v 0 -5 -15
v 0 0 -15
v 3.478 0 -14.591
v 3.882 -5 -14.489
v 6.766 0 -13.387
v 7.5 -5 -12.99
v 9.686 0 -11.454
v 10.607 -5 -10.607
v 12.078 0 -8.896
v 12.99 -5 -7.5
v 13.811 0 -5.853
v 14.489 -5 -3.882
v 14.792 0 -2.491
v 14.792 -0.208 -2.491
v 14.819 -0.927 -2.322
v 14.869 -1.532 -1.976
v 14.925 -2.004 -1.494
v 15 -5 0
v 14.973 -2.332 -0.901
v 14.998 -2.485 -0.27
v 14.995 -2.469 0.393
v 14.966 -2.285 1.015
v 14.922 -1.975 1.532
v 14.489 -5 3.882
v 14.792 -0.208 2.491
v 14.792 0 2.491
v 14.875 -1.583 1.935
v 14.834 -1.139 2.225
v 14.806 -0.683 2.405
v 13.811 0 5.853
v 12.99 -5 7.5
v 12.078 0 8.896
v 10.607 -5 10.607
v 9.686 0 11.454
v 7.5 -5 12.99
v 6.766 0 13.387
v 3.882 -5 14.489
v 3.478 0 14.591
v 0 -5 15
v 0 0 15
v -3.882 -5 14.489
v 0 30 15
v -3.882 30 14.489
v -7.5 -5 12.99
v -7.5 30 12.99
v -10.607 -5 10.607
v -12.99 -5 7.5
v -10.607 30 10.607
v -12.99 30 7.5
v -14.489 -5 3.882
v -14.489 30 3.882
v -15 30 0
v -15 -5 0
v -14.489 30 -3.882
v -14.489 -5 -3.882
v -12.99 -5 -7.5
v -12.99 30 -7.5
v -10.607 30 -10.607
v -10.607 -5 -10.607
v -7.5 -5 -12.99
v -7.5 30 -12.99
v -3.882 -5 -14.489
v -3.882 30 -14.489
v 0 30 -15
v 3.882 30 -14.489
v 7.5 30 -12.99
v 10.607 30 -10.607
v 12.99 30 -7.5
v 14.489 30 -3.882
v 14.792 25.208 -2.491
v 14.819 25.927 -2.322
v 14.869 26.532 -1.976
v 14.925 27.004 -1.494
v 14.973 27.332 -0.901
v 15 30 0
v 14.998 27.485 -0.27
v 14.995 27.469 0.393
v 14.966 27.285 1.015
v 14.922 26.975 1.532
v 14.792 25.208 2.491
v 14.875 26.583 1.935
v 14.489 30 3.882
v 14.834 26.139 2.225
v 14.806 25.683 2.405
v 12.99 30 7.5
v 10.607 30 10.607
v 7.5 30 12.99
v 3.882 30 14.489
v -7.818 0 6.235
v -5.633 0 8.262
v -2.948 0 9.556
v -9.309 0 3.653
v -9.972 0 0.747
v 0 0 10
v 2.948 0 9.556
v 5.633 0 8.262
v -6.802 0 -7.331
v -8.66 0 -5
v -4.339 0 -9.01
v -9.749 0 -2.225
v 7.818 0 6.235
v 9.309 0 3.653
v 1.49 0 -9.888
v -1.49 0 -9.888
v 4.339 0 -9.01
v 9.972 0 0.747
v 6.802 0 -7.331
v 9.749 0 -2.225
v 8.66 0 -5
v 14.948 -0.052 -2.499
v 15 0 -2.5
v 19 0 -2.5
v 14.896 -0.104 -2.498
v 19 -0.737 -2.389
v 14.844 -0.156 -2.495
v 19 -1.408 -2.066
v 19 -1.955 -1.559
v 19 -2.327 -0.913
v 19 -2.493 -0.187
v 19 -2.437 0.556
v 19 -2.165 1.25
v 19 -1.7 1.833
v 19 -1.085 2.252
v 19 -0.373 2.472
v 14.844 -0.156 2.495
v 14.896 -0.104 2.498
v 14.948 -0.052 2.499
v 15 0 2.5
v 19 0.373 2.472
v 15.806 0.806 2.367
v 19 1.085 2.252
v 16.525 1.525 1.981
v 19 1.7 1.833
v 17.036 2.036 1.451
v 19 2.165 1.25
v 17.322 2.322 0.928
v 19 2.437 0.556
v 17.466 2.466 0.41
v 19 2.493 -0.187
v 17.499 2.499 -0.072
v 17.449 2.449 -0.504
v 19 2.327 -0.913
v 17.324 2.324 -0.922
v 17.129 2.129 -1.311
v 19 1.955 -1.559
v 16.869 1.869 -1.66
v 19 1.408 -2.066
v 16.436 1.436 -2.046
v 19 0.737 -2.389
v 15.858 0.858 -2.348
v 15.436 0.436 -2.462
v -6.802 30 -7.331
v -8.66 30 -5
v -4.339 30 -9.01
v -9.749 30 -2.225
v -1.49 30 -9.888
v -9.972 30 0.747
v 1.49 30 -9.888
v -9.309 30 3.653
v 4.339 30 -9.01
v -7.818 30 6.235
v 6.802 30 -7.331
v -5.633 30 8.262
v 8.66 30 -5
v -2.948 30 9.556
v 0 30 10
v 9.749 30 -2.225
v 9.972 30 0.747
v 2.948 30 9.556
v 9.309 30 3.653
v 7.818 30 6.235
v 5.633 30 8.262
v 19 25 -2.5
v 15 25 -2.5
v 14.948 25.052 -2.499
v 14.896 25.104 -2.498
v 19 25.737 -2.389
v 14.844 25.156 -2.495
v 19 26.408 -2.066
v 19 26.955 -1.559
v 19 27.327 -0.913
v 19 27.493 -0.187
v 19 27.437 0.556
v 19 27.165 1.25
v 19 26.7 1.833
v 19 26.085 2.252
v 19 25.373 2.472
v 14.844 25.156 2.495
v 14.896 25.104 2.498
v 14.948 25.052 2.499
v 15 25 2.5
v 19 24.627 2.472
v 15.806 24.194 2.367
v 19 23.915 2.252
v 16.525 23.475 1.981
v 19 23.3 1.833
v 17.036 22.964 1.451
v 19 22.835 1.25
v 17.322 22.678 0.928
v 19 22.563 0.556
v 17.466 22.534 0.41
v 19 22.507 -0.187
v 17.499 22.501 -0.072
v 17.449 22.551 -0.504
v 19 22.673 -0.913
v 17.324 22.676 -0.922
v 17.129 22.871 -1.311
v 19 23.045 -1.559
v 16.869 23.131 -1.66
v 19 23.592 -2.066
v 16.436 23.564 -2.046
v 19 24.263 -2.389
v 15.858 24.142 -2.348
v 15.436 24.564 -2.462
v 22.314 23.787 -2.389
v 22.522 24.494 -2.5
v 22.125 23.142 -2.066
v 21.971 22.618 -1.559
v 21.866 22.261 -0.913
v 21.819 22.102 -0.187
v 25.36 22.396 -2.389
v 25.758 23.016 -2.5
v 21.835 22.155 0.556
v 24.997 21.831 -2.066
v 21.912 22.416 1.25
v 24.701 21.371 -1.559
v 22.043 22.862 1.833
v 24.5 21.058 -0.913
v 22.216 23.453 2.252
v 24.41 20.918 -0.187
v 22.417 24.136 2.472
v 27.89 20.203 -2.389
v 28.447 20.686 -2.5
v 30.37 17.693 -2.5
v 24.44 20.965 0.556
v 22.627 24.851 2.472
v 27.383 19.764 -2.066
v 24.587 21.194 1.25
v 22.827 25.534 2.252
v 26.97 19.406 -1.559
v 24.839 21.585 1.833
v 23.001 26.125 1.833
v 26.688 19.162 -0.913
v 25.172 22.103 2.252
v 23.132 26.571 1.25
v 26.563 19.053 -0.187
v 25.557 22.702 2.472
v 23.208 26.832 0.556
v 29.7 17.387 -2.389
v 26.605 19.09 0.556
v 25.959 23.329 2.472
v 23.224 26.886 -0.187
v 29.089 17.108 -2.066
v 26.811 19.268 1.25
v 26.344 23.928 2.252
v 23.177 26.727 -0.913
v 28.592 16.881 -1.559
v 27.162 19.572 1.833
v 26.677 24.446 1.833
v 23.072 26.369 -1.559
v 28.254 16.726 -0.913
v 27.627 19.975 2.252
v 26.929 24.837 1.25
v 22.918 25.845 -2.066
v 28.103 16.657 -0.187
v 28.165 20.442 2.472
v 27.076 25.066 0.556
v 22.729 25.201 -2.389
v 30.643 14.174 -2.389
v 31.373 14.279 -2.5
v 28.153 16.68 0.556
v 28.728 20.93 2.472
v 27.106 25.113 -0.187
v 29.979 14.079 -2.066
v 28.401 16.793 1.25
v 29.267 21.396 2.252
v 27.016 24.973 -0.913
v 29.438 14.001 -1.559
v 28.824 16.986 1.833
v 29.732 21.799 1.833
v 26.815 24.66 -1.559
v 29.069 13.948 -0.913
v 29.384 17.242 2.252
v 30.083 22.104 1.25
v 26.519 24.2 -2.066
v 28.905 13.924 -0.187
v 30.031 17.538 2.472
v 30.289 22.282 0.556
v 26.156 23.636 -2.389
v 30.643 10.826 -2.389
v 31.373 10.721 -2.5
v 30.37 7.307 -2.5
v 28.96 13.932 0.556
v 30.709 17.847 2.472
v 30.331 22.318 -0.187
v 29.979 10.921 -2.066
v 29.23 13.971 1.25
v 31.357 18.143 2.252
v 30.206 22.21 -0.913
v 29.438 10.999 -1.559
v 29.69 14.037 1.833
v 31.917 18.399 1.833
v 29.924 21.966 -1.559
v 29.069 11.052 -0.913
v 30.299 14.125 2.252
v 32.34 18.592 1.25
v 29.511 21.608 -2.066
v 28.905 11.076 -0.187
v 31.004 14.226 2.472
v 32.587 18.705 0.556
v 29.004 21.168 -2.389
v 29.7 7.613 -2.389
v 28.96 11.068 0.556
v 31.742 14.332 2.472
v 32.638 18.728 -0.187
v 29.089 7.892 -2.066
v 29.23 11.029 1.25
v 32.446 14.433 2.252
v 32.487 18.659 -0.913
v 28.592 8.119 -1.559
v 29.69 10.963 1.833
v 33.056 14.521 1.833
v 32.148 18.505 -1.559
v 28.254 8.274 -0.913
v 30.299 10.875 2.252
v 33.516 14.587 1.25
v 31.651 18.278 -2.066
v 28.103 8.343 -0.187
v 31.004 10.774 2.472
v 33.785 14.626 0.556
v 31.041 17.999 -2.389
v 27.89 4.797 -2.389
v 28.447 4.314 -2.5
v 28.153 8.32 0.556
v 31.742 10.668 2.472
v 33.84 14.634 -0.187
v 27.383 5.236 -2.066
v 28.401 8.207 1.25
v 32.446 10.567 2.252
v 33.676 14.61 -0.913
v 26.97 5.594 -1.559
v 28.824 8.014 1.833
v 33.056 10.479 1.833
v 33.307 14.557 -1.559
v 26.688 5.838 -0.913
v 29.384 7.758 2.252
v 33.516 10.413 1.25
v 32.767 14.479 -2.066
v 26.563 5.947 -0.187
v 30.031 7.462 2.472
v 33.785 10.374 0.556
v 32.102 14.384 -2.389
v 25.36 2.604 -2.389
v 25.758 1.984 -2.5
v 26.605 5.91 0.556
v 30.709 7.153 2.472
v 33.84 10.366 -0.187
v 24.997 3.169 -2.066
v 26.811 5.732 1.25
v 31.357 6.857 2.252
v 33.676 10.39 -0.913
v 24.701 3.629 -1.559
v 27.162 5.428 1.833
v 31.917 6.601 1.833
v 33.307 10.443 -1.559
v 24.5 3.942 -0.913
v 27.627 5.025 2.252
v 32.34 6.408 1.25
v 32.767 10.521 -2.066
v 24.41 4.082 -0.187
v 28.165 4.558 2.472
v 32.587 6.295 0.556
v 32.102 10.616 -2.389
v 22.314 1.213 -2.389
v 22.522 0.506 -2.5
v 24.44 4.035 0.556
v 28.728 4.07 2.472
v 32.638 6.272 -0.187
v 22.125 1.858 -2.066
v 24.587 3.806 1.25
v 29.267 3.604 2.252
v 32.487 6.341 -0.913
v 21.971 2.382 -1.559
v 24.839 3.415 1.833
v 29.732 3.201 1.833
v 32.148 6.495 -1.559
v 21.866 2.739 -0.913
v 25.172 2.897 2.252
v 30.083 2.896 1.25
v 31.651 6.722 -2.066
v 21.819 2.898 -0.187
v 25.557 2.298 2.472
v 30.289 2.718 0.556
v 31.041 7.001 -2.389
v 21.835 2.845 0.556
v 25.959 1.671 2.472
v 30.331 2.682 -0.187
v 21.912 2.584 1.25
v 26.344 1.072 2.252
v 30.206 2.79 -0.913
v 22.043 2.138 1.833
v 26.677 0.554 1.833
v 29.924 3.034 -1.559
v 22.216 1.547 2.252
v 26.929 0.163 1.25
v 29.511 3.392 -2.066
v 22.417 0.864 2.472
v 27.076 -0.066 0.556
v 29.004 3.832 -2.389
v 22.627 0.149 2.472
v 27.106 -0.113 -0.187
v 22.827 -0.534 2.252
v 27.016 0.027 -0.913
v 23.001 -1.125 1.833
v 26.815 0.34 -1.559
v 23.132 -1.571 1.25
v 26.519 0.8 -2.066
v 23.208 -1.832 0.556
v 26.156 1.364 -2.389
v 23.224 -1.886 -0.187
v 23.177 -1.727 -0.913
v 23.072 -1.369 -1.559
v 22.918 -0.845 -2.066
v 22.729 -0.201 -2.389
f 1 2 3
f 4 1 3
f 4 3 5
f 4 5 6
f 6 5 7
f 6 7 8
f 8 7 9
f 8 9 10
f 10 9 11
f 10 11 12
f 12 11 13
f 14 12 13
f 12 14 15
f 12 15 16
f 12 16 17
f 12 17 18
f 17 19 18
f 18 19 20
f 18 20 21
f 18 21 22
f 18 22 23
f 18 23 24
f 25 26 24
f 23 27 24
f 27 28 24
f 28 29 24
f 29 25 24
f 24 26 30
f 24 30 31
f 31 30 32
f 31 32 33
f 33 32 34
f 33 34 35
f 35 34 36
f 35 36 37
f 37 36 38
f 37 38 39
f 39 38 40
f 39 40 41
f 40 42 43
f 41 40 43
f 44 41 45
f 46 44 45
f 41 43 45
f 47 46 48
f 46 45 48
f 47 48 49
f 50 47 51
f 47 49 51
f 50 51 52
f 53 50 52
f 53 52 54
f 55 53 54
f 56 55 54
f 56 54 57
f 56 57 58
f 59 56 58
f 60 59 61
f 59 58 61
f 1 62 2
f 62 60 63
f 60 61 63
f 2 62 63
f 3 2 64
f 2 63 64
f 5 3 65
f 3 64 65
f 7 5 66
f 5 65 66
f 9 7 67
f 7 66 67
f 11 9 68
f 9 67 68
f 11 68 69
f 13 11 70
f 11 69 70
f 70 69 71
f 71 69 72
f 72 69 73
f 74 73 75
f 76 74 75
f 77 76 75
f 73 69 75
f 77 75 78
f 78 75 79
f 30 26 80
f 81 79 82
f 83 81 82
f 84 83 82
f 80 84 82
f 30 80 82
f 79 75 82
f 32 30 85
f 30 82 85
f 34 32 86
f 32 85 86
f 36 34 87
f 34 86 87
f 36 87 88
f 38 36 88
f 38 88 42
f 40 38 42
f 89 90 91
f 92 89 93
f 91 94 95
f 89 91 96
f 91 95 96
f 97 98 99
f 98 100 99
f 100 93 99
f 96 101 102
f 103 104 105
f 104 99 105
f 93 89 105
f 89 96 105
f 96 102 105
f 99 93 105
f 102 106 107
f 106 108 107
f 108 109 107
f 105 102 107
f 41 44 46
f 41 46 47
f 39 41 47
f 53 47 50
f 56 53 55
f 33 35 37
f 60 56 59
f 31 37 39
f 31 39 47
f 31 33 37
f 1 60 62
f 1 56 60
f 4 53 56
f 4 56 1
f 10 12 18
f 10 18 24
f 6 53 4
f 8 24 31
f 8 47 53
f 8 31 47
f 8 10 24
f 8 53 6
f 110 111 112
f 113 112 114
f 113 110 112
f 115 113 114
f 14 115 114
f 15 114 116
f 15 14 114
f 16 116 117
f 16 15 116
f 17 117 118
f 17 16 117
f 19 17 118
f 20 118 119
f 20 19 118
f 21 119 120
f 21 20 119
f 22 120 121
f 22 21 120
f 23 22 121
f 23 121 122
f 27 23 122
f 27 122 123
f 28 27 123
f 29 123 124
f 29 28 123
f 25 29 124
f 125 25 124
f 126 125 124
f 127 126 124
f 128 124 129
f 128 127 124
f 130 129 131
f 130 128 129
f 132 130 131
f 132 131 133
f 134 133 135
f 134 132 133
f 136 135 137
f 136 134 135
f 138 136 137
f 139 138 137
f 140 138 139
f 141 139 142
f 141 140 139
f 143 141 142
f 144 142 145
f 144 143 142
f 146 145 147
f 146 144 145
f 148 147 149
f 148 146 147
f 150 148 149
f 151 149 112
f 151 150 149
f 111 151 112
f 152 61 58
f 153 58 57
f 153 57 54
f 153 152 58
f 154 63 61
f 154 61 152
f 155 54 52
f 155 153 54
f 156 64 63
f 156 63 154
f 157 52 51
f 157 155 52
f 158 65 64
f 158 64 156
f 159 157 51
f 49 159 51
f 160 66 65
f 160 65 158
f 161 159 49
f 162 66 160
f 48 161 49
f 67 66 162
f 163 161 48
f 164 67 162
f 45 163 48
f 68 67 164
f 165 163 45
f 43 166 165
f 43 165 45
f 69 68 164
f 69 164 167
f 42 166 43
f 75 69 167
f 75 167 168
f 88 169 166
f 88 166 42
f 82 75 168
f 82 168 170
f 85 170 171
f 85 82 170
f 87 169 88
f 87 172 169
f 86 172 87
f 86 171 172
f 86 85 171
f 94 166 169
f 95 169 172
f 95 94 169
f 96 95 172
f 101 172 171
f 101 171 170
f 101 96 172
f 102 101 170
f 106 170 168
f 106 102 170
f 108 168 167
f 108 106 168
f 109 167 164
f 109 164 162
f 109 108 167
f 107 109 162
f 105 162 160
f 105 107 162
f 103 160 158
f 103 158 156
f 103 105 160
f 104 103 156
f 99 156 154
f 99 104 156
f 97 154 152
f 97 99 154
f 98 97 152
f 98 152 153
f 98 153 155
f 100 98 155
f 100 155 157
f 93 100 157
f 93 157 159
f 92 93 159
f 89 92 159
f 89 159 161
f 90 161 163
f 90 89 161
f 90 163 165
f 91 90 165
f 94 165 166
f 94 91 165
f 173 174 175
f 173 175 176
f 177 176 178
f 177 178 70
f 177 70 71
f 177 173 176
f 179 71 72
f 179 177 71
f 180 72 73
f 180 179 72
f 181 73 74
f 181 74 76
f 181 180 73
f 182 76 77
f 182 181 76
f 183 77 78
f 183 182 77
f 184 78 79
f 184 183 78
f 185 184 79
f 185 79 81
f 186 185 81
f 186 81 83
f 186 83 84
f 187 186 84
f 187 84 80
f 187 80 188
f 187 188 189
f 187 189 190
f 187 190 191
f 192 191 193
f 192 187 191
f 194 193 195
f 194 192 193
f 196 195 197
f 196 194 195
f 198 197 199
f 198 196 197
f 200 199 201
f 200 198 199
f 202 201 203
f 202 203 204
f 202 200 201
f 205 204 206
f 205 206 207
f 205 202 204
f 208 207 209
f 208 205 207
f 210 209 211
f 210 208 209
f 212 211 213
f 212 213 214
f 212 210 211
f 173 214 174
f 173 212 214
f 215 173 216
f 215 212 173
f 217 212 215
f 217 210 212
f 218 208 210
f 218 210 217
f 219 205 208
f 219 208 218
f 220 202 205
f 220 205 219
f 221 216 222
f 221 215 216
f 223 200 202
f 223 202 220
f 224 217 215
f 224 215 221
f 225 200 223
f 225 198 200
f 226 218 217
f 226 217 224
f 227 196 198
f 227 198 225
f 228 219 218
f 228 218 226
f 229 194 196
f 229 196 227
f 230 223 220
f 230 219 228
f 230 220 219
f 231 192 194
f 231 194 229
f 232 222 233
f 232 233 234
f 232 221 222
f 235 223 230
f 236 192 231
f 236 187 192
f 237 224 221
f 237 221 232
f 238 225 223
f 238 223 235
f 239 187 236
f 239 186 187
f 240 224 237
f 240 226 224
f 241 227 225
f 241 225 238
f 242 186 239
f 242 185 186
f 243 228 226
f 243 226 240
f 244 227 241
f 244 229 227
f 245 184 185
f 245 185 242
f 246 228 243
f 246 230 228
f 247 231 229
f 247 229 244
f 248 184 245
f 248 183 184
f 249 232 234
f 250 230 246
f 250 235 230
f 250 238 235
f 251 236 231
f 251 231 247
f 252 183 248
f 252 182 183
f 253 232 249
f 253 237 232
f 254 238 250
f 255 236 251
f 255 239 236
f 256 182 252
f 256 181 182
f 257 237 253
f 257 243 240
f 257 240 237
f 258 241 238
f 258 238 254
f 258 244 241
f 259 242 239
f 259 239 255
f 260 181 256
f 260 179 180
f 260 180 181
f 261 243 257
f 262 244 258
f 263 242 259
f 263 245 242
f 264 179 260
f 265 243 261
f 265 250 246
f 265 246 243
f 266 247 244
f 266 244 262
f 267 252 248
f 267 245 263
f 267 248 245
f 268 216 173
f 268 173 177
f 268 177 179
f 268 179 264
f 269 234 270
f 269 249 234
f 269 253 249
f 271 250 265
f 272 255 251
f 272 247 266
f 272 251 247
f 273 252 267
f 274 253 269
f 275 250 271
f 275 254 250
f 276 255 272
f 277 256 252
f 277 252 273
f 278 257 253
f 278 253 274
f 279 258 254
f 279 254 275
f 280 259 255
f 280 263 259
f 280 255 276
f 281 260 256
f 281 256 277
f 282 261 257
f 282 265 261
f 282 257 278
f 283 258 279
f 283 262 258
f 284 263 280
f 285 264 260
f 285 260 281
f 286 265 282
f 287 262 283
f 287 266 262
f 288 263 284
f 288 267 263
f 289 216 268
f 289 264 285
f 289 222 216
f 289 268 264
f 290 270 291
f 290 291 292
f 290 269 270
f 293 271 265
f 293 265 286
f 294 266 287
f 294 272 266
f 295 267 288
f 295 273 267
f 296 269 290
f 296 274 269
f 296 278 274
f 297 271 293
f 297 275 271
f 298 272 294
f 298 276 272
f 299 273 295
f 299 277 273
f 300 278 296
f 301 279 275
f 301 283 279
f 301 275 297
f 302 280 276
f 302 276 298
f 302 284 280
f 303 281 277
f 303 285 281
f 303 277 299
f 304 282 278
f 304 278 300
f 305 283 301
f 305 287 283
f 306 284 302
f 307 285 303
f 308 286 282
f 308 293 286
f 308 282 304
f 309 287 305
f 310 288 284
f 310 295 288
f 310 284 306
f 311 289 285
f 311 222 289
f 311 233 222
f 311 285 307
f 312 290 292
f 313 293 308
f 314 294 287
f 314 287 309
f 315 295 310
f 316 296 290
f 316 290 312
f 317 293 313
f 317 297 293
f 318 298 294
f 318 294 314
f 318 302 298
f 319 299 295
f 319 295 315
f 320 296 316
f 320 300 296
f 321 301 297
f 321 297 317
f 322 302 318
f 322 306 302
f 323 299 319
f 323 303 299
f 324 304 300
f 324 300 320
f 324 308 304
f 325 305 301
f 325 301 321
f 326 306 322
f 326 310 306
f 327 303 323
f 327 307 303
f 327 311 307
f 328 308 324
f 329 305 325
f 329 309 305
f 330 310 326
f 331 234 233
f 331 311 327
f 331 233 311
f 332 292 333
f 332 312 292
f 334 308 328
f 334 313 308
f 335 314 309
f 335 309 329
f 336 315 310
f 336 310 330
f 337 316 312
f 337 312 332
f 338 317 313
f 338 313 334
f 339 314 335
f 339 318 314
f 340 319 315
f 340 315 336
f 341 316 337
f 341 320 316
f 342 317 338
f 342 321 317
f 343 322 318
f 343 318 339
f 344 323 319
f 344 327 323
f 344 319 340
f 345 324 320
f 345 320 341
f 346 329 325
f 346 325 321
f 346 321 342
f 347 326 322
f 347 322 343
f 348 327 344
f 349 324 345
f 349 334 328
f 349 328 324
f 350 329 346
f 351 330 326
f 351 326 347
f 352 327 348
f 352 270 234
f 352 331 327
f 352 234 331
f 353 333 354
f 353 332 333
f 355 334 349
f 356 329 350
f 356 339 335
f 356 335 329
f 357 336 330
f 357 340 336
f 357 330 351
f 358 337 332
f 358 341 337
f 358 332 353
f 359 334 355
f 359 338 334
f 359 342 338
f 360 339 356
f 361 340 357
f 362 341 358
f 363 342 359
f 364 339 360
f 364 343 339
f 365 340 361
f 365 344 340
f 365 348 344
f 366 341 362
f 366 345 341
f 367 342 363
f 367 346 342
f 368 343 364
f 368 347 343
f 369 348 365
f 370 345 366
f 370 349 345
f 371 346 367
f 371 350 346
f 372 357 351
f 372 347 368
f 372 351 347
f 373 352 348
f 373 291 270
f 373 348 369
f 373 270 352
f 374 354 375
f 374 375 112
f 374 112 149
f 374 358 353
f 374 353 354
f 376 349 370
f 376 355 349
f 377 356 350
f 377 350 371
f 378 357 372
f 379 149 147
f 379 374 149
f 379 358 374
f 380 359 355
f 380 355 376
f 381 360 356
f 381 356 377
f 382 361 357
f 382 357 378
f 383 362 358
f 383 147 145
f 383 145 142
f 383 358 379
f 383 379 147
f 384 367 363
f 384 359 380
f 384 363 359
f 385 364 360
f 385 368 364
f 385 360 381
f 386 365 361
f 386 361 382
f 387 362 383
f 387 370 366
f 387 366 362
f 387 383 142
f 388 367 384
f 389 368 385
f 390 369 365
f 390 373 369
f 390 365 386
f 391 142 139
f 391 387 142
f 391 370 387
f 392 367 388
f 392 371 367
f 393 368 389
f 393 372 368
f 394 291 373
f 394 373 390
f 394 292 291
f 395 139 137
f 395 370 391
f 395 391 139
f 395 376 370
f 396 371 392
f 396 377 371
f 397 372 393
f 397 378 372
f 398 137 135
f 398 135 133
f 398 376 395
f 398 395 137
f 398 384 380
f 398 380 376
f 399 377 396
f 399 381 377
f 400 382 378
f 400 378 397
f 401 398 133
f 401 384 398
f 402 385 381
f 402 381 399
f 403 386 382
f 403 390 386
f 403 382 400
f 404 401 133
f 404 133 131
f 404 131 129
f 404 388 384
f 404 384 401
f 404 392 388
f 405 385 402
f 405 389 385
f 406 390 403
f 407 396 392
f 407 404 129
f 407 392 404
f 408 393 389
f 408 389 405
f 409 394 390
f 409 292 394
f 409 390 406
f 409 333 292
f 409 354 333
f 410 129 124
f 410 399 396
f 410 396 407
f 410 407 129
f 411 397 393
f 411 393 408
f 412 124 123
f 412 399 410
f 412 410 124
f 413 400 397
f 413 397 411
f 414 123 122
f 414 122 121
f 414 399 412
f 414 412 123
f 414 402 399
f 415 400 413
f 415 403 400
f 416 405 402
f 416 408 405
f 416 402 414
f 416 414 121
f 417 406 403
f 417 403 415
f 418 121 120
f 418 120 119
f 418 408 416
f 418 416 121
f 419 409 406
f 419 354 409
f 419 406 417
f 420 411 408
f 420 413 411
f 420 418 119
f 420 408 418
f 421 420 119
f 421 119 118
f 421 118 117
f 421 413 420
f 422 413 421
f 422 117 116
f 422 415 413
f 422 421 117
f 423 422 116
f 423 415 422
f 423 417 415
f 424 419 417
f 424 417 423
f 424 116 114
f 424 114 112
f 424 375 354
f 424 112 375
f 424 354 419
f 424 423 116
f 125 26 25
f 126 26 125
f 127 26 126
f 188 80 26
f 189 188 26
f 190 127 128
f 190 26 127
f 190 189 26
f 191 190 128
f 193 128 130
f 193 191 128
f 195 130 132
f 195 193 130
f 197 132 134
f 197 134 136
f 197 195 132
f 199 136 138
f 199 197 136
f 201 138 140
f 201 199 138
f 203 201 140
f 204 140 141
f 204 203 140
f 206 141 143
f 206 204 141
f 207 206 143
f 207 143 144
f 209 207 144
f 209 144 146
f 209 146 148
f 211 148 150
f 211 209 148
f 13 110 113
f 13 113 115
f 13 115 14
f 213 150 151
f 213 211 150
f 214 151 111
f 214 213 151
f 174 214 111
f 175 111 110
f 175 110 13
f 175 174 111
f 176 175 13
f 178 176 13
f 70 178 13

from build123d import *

# Parameters (mm, degrees)
SKETCH1_R           = 15
SKETCH1_R_2         = 10
BOSS_EXTRUDE1_DEPTH = 30
SKETCH2_R           = 15
BOSS_EXTRUDE2_DEPTH = 5
SKETCH7_R           = 2.5


with BuildPart() as part:
    # Sketch1 → Boss-Extrude1 (new body)
    with BuildSketch(Plane(origin=(0, 0, 0), x_dir=(1, 0, 0), z_dir=(0, 1, 0))):
        with Locations(Location((0, 0, 0), (0, 0, 270))):  # turned: the seam where the file's is
            Circle(SKETCH1_R)
        with Locations(Location((0, 0, 0), (0, 0, 270))):  # turned: the seam where the file's is
            Circle(SKETCH1_R_2, mode=Mode.SUBTRACT)
    extrude(amount=BOSS_EXTRUDE1_DEPTH)

    # Sketch2 → Boss-Extrude2 (add)
    with BuildSketch(Plane.XZ):
        with Locations(Location((0, 0, 0), (0, 0, 270))):  # turned: the seam where the file's is
            Circle(SKETCH2_R)
    extrude(amount=BOSS_EXTRUDE2_DEPTH)

    # Sweep6: sweep along a path in Sketch3
    with BuildLine(Plane.XY) as sweep6_path:
        Line((15, 25), (19, 25))
        ThreePointArc((19, 25), (31.5, 12.5), (19, 0))
        Line((19, 0), (15, 0))
        Line((15, 0), (15, 25))
    # Sketch7 → Sweep6 (sweep)
    with BuildSketch(Plane(origin=(15, 0, 0), x_dir=(0, 0, -1), z_dir=(1, 0, 0))):
        with Locations((0, 25)):
            Circle(SKETCH7_R)
    sweep(path=sweep6_path.line, transition=Transition.RIGHT)


solid = part.part
